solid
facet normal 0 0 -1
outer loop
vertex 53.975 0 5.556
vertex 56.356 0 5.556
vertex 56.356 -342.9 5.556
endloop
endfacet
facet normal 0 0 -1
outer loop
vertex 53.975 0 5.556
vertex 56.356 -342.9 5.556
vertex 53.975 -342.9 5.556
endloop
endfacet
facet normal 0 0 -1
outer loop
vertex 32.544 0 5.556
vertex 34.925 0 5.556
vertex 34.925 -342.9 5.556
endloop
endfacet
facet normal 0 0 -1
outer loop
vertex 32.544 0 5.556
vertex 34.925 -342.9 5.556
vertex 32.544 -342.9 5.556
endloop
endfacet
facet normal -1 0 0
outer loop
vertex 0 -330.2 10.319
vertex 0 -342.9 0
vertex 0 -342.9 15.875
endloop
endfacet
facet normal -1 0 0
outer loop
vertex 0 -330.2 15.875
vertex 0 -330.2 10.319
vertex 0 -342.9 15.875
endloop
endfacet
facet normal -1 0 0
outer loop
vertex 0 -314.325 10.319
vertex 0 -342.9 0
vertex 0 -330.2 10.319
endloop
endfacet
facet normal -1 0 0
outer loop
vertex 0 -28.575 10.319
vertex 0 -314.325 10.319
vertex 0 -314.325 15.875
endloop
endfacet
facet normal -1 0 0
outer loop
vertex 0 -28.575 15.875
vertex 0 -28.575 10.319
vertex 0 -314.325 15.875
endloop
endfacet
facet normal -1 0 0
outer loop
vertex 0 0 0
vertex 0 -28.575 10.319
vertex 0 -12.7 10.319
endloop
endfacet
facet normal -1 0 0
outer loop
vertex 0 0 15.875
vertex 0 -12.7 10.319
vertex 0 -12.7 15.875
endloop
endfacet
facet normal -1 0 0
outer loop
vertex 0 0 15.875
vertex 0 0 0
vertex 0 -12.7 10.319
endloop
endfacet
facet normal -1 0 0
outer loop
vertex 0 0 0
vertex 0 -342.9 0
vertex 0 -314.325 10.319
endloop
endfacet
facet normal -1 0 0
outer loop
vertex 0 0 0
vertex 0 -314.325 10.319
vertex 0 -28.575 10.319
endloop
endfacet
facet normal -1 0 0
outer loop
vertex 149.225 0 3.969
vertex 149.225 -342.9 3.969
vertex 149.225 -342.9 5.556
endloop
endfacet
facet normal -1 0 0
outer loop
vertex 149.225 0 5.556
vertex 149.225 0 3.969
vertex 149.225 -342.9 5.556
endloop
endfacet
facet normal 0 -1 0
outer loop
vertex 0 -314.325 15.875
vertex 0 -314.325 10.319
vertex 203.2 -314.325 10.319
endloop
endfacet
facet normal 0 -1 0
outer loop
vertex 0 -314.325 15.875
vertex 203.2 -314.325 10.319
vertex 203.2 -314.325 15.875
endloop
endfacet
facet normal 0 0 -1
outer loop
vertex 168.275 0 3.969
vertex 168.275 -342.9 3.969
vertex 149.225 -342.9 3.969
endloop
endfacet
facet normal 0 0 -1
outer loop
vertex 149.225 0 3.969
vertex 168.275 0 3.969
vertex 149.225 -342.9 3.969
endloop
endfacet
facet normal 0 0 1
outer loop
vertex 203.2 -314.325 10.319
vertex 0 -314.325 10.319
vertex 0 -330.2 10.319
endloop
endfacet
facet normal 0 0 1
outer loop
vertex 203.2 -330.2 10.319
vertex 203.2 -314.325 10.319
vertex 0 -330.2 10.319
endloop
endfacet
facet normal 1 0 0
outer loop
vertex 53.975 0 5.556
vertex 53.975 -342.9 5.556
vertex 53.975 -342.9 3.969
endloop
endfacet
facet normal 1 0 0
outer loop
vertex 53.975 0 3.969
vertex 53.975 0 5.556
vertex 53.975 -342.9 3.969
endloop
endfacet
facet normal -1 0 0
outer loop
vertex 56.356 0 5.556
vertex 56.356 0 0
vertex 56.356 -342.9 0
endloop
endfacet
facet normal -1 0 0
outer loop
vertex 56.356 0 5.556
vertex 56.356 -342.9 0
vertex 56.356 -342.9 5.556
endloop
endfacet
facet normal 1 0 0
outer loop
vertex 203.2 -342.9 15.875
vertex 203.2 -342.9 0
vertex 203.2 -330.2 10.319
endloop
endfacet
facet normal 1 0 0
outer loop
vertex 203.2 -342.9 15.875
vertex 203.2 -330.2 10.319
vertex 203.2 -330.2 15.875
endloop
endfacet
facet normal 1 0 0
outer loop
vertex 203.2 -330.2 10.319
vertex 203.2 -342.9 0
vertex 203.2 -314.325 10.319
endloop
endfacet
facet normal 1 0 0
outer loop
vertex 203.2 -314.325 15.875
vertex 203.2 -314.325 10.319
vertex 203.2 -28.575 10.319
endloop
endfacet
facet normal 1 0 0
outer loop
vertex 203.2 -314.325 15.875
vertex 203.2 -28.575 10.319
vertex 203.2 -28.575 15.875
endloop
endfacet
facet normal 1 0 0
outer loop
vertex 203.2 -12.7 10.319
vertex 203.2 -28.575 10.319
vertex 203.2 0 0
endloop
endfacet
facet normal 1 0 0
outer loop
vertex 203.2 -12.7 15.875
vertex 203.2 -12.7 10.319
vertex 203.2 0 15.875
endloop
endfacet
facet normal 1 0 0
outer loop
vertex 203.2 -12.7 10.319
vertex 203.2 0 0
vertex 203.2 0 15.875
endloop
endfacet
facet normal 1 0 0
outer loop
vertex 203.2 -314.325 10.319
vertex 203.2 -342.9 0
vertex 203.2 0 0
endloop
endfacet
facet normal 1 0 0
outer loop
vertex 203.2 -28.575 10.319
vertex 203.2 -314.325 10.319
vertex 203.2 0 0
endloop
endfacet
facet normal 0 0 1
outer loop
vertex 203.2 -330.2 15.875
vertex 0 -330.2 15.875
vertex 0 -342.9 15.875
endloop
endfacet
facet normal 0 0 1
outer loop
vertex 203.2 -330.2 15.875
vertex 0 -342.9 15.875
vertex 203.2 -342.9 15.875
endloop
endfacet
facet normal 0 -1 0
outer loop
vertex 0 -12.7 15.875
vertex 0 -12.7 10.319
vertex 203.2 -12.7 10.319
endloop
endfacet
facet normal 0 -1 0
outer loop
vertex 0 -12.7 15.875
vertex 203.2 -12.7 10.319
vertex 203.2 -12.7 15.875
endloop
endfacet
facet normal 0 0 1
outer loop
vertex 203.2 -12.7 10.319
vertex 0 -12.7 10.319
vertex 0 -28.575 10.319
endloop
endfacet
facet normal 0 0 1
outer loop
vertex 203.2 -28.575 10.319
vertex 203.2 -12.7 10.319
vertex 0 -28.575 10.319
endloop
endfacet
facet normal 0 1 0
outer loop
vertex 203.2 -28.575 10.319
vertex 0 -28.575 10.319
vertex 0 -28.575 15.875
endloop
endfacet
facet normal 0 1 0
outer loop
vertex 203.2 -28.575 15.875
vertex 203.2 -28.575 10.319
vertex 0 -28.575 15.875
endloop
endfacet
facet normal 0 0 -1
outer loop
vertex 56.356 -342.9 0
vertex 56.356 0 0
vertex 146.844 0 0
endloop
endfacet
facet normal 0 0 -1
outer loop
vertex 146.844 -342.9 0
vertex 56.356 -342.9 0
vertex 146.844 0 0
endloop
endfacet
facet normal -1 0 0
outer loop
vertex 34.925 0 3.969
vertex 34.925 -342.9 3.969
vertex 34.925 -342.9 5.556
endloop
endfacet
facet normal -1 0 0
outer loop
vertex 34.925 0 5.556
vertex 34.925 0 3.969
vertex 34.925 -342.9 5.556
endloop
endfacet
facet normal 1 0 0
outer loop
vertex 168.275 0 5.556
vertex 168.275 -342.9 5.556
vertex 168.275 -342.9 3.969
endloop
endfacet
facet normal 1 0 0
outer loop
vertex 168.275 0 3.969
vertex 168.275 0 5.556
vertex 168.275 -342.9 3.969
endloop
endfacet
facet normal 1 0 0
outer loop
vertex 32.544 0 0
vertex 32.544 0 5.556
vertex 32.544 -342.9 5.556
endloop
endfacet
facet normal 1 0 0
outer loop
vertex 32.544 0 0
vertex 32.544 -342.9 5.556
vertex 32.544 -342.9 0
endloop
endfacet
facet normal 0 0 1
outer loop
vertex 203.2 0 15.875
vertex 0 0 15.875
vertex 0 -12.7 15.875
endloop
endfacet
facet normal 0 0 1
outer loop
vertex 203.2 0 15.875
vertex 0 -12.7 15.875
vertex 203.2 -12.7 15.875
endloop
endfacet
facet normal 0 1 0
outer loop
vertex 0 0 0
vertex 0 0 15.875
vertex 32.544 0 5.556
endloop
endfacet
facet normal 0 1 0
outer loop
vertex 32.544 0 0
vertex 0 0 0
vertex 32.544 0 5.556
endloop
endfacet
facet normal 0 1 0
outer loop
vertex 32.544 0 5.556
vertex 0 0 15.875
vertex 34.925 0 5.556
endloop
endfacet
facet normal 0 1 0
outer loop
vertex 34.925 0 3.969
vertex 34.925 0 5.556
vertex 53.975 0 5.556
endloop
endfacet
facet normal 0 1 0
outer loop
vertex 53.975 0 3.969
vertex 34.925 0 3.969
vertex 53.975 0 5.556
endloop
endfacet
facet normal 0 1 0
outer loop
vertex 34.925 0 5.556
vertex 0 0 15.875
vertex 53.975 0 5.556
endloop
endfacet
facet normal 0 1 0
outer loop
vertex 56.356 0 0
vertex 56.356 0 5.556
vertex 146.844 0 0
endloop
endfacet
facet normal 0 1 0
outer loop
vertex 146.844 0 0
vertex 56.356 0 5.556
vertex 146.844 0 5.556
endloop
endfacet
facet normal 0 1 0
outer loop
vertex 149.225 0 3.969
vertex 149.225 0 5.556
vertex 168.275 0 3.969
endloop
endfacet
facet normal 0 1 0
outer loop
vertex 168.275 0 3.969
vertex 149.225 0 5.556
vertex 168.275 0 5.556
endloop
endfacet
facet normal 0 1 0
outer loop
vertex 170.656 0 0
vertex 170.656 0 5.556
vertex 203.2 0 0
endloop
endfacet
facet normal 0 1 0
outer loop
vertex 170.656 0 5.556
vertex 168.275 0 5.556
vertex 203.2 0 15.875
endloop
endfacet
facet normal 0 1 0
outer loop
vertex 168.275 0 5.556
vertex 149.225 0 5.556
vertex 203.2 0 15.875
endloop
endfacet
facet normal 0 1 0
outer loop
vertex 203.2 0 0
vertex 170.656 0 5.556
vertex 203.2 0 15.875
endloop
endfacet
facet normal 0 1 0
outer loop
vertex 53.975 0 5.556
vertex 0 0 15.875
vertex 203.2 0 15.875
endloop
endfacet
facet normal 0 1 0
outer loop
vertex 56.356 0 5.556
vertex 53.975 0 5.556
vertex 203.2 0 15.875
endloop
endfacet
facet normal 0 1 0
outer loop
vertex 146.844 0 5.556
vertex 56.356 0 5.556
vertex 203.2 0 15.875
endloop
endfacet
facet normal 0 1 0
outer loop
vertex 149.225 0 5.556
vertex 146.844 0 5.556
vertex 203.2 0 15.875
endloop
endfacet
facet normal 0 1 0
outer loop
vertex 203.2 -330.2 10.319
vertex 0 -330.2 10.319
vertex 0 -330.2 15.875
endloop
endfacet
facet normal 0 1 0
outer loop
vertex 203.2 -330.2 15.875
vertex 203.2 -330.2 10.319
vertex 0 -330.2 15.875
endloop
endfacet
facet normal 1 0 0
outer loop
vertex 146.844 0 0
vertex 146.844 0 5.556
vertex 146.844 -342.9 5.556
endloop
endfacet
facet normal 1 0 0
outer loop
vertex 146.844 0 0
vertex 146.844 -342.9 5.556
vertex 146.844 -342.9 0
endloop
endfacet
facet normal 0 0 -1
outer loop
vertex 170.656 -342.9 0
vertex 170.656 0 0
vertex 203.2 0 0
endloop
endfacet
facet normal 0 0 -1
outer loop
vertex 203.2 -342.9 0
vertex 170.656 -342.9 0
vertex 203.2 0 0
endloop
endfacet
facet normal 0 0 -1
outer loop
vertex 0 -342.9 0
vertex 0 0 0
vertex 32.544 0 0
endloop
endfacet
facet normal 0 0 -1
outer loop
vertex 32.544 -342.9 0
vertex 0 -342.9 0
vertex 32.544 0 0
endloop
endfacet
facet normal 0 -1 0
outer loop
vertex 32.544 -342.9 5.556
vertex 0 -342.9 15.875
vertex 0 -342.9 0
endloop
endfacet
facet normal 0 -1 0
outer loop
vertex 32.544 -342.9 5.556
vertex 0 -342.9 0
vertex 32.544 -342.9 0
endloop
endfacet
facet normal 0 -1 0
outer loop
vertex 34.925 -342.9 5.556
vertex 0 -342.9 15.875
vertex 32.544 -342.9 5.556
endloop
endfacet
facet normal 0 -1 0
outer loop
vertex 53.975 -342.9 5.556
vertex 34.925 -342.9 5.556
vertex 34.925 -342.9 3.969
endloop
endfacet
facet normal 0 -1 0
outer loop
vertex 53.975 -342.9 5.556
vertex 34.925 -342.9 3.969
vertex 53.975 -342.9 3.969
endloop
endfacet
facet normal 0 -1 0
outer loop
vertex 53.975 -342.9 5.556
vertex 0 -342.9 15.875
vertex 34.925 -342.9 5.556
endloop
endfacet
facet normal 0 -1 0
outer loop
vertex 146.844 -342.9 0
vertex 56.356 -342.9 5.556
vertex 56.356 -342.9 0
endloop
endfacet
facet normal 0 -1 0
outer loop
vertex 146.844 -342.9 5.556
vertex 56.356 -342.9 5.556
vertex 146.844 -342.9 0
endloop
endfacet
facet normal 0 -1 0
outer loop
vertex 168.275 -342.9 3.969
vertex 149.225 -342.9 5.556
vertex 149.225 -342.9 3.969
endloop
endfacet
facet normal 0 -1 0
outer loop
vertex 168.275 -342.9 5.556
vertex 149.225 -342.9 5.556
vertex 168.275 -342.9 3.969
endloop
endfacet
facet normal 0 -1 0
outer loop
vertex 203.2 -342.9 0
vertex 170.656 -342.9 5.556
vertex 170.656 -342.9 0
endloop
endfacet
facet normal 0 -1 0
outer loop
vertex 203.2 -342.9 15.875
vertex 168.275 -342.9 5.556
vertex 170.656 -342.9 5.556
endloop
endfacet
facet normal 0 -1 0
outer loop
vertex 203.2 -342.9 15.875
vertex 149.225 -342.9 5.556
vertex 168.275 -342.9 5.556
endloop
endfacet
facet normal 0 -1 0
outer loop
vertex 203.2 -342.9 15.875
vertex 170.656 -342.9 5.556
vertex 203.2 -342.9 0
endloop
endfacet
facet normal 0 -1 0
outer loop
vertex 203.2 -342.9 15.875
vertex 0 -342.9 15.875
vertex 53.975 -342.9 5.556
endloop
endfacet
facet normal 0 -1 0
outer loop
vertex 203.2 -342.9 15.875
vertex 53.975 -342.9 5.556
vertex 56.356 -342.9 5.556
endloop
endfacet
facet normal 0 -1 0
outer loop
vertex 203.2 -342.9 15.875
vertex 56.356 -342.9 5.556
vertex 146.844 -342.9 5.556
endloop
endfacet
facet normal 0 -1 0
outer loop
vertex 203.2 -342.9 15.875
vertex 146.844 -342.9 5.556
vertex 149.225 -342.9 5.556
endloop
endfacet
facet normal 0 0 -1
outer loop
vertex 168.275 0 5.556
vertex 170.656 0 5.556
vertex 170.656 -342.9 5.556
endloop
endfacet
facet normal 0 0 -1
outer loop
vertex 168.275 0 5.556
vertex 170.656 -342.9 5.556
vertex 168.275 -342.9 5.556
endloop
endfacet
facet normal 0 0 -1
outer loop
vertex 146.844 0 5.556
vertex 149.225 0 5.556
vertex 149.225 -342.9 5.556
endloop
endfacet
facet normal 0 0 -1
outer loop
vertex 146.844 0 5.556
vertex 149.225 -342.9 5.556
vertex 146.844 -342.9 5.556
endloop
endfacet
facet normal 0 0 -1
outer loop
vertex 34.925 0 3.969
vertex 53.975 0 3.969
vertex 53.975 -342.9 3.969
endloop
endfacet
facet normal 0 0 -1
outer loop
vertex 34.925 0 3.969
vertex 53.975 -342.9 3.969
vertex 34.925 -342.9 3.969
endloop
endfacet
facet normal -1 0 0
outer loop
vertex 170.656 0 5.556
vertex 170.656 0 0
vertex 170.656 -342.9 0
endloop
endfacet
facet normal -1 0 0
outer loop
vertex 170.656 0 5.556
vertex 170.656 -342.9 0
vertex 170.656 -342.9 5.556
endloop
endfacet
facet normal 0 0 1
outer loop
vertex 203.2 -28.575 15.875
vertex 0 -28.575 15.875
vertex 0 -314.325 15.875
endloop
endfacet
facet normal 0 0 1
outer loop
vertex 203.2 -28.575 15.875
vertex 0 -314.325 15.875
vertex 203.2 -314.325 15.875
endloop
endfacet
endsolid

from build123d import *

# Parameters (mm, degrees)
F0_W     = 203.2
F0_H     = 15.875
F1_DEPTH = 342.9
F3_DEPTH = 342.9
F4_W     = 15.875
F4_H     = 5.55625
F5_DEPTH = 203.2


with BuildPart() as f1:
    # F0 (on Front) → F1 (new body)
    with BuildSketch(Plane.XZ):
        with Locations((101.6, 7.9375)):
            Rectangle(F0_W, F0_H)
    extrude(amount=F1_DEPTH)

    # F2 (on face) → F3 (cut, through all)
    with BuildSketch(Plane.XZ.offset(342.9)):
        Polygon((32.54375, 5.55625), (32.54375, 0), (56.35625, 0), (56.35625, 5.55625), (53.975, 5.55625), (53.975, 3.96875), (34.925, 3.96875), (34.925, 5.55625), align=None)
        Polygon((170.65625, 5.55625), (168.275, 5.55625), (168.275, 3.96875), (149.225, 3.96875), (149.225, 5.55625), (146.84375, 5.55625), (146.84375, 0), (170.65625, 0), align=None)
    extrude(amount=-F3_DEPTH, mode=Mode.SUBTRACT)

    # F4 (on face) → F5 (cut, through all)
    with BuildSketch(Plane(origin=(0, 0, 0), x_dir=(0, -1, 0), z_dir=(-1, 0, 0))):
        with Locations((20.6375, 13.096875)):
            Rectangle(F4_W, F4_H)
        with Locations((322.2625, 13.096875)):
            Rectangle(F4_W, F4_H)
    extrude(amount=-F5_DEPTH, mode=Mode.SUBTRACT)


solid = f1.part
